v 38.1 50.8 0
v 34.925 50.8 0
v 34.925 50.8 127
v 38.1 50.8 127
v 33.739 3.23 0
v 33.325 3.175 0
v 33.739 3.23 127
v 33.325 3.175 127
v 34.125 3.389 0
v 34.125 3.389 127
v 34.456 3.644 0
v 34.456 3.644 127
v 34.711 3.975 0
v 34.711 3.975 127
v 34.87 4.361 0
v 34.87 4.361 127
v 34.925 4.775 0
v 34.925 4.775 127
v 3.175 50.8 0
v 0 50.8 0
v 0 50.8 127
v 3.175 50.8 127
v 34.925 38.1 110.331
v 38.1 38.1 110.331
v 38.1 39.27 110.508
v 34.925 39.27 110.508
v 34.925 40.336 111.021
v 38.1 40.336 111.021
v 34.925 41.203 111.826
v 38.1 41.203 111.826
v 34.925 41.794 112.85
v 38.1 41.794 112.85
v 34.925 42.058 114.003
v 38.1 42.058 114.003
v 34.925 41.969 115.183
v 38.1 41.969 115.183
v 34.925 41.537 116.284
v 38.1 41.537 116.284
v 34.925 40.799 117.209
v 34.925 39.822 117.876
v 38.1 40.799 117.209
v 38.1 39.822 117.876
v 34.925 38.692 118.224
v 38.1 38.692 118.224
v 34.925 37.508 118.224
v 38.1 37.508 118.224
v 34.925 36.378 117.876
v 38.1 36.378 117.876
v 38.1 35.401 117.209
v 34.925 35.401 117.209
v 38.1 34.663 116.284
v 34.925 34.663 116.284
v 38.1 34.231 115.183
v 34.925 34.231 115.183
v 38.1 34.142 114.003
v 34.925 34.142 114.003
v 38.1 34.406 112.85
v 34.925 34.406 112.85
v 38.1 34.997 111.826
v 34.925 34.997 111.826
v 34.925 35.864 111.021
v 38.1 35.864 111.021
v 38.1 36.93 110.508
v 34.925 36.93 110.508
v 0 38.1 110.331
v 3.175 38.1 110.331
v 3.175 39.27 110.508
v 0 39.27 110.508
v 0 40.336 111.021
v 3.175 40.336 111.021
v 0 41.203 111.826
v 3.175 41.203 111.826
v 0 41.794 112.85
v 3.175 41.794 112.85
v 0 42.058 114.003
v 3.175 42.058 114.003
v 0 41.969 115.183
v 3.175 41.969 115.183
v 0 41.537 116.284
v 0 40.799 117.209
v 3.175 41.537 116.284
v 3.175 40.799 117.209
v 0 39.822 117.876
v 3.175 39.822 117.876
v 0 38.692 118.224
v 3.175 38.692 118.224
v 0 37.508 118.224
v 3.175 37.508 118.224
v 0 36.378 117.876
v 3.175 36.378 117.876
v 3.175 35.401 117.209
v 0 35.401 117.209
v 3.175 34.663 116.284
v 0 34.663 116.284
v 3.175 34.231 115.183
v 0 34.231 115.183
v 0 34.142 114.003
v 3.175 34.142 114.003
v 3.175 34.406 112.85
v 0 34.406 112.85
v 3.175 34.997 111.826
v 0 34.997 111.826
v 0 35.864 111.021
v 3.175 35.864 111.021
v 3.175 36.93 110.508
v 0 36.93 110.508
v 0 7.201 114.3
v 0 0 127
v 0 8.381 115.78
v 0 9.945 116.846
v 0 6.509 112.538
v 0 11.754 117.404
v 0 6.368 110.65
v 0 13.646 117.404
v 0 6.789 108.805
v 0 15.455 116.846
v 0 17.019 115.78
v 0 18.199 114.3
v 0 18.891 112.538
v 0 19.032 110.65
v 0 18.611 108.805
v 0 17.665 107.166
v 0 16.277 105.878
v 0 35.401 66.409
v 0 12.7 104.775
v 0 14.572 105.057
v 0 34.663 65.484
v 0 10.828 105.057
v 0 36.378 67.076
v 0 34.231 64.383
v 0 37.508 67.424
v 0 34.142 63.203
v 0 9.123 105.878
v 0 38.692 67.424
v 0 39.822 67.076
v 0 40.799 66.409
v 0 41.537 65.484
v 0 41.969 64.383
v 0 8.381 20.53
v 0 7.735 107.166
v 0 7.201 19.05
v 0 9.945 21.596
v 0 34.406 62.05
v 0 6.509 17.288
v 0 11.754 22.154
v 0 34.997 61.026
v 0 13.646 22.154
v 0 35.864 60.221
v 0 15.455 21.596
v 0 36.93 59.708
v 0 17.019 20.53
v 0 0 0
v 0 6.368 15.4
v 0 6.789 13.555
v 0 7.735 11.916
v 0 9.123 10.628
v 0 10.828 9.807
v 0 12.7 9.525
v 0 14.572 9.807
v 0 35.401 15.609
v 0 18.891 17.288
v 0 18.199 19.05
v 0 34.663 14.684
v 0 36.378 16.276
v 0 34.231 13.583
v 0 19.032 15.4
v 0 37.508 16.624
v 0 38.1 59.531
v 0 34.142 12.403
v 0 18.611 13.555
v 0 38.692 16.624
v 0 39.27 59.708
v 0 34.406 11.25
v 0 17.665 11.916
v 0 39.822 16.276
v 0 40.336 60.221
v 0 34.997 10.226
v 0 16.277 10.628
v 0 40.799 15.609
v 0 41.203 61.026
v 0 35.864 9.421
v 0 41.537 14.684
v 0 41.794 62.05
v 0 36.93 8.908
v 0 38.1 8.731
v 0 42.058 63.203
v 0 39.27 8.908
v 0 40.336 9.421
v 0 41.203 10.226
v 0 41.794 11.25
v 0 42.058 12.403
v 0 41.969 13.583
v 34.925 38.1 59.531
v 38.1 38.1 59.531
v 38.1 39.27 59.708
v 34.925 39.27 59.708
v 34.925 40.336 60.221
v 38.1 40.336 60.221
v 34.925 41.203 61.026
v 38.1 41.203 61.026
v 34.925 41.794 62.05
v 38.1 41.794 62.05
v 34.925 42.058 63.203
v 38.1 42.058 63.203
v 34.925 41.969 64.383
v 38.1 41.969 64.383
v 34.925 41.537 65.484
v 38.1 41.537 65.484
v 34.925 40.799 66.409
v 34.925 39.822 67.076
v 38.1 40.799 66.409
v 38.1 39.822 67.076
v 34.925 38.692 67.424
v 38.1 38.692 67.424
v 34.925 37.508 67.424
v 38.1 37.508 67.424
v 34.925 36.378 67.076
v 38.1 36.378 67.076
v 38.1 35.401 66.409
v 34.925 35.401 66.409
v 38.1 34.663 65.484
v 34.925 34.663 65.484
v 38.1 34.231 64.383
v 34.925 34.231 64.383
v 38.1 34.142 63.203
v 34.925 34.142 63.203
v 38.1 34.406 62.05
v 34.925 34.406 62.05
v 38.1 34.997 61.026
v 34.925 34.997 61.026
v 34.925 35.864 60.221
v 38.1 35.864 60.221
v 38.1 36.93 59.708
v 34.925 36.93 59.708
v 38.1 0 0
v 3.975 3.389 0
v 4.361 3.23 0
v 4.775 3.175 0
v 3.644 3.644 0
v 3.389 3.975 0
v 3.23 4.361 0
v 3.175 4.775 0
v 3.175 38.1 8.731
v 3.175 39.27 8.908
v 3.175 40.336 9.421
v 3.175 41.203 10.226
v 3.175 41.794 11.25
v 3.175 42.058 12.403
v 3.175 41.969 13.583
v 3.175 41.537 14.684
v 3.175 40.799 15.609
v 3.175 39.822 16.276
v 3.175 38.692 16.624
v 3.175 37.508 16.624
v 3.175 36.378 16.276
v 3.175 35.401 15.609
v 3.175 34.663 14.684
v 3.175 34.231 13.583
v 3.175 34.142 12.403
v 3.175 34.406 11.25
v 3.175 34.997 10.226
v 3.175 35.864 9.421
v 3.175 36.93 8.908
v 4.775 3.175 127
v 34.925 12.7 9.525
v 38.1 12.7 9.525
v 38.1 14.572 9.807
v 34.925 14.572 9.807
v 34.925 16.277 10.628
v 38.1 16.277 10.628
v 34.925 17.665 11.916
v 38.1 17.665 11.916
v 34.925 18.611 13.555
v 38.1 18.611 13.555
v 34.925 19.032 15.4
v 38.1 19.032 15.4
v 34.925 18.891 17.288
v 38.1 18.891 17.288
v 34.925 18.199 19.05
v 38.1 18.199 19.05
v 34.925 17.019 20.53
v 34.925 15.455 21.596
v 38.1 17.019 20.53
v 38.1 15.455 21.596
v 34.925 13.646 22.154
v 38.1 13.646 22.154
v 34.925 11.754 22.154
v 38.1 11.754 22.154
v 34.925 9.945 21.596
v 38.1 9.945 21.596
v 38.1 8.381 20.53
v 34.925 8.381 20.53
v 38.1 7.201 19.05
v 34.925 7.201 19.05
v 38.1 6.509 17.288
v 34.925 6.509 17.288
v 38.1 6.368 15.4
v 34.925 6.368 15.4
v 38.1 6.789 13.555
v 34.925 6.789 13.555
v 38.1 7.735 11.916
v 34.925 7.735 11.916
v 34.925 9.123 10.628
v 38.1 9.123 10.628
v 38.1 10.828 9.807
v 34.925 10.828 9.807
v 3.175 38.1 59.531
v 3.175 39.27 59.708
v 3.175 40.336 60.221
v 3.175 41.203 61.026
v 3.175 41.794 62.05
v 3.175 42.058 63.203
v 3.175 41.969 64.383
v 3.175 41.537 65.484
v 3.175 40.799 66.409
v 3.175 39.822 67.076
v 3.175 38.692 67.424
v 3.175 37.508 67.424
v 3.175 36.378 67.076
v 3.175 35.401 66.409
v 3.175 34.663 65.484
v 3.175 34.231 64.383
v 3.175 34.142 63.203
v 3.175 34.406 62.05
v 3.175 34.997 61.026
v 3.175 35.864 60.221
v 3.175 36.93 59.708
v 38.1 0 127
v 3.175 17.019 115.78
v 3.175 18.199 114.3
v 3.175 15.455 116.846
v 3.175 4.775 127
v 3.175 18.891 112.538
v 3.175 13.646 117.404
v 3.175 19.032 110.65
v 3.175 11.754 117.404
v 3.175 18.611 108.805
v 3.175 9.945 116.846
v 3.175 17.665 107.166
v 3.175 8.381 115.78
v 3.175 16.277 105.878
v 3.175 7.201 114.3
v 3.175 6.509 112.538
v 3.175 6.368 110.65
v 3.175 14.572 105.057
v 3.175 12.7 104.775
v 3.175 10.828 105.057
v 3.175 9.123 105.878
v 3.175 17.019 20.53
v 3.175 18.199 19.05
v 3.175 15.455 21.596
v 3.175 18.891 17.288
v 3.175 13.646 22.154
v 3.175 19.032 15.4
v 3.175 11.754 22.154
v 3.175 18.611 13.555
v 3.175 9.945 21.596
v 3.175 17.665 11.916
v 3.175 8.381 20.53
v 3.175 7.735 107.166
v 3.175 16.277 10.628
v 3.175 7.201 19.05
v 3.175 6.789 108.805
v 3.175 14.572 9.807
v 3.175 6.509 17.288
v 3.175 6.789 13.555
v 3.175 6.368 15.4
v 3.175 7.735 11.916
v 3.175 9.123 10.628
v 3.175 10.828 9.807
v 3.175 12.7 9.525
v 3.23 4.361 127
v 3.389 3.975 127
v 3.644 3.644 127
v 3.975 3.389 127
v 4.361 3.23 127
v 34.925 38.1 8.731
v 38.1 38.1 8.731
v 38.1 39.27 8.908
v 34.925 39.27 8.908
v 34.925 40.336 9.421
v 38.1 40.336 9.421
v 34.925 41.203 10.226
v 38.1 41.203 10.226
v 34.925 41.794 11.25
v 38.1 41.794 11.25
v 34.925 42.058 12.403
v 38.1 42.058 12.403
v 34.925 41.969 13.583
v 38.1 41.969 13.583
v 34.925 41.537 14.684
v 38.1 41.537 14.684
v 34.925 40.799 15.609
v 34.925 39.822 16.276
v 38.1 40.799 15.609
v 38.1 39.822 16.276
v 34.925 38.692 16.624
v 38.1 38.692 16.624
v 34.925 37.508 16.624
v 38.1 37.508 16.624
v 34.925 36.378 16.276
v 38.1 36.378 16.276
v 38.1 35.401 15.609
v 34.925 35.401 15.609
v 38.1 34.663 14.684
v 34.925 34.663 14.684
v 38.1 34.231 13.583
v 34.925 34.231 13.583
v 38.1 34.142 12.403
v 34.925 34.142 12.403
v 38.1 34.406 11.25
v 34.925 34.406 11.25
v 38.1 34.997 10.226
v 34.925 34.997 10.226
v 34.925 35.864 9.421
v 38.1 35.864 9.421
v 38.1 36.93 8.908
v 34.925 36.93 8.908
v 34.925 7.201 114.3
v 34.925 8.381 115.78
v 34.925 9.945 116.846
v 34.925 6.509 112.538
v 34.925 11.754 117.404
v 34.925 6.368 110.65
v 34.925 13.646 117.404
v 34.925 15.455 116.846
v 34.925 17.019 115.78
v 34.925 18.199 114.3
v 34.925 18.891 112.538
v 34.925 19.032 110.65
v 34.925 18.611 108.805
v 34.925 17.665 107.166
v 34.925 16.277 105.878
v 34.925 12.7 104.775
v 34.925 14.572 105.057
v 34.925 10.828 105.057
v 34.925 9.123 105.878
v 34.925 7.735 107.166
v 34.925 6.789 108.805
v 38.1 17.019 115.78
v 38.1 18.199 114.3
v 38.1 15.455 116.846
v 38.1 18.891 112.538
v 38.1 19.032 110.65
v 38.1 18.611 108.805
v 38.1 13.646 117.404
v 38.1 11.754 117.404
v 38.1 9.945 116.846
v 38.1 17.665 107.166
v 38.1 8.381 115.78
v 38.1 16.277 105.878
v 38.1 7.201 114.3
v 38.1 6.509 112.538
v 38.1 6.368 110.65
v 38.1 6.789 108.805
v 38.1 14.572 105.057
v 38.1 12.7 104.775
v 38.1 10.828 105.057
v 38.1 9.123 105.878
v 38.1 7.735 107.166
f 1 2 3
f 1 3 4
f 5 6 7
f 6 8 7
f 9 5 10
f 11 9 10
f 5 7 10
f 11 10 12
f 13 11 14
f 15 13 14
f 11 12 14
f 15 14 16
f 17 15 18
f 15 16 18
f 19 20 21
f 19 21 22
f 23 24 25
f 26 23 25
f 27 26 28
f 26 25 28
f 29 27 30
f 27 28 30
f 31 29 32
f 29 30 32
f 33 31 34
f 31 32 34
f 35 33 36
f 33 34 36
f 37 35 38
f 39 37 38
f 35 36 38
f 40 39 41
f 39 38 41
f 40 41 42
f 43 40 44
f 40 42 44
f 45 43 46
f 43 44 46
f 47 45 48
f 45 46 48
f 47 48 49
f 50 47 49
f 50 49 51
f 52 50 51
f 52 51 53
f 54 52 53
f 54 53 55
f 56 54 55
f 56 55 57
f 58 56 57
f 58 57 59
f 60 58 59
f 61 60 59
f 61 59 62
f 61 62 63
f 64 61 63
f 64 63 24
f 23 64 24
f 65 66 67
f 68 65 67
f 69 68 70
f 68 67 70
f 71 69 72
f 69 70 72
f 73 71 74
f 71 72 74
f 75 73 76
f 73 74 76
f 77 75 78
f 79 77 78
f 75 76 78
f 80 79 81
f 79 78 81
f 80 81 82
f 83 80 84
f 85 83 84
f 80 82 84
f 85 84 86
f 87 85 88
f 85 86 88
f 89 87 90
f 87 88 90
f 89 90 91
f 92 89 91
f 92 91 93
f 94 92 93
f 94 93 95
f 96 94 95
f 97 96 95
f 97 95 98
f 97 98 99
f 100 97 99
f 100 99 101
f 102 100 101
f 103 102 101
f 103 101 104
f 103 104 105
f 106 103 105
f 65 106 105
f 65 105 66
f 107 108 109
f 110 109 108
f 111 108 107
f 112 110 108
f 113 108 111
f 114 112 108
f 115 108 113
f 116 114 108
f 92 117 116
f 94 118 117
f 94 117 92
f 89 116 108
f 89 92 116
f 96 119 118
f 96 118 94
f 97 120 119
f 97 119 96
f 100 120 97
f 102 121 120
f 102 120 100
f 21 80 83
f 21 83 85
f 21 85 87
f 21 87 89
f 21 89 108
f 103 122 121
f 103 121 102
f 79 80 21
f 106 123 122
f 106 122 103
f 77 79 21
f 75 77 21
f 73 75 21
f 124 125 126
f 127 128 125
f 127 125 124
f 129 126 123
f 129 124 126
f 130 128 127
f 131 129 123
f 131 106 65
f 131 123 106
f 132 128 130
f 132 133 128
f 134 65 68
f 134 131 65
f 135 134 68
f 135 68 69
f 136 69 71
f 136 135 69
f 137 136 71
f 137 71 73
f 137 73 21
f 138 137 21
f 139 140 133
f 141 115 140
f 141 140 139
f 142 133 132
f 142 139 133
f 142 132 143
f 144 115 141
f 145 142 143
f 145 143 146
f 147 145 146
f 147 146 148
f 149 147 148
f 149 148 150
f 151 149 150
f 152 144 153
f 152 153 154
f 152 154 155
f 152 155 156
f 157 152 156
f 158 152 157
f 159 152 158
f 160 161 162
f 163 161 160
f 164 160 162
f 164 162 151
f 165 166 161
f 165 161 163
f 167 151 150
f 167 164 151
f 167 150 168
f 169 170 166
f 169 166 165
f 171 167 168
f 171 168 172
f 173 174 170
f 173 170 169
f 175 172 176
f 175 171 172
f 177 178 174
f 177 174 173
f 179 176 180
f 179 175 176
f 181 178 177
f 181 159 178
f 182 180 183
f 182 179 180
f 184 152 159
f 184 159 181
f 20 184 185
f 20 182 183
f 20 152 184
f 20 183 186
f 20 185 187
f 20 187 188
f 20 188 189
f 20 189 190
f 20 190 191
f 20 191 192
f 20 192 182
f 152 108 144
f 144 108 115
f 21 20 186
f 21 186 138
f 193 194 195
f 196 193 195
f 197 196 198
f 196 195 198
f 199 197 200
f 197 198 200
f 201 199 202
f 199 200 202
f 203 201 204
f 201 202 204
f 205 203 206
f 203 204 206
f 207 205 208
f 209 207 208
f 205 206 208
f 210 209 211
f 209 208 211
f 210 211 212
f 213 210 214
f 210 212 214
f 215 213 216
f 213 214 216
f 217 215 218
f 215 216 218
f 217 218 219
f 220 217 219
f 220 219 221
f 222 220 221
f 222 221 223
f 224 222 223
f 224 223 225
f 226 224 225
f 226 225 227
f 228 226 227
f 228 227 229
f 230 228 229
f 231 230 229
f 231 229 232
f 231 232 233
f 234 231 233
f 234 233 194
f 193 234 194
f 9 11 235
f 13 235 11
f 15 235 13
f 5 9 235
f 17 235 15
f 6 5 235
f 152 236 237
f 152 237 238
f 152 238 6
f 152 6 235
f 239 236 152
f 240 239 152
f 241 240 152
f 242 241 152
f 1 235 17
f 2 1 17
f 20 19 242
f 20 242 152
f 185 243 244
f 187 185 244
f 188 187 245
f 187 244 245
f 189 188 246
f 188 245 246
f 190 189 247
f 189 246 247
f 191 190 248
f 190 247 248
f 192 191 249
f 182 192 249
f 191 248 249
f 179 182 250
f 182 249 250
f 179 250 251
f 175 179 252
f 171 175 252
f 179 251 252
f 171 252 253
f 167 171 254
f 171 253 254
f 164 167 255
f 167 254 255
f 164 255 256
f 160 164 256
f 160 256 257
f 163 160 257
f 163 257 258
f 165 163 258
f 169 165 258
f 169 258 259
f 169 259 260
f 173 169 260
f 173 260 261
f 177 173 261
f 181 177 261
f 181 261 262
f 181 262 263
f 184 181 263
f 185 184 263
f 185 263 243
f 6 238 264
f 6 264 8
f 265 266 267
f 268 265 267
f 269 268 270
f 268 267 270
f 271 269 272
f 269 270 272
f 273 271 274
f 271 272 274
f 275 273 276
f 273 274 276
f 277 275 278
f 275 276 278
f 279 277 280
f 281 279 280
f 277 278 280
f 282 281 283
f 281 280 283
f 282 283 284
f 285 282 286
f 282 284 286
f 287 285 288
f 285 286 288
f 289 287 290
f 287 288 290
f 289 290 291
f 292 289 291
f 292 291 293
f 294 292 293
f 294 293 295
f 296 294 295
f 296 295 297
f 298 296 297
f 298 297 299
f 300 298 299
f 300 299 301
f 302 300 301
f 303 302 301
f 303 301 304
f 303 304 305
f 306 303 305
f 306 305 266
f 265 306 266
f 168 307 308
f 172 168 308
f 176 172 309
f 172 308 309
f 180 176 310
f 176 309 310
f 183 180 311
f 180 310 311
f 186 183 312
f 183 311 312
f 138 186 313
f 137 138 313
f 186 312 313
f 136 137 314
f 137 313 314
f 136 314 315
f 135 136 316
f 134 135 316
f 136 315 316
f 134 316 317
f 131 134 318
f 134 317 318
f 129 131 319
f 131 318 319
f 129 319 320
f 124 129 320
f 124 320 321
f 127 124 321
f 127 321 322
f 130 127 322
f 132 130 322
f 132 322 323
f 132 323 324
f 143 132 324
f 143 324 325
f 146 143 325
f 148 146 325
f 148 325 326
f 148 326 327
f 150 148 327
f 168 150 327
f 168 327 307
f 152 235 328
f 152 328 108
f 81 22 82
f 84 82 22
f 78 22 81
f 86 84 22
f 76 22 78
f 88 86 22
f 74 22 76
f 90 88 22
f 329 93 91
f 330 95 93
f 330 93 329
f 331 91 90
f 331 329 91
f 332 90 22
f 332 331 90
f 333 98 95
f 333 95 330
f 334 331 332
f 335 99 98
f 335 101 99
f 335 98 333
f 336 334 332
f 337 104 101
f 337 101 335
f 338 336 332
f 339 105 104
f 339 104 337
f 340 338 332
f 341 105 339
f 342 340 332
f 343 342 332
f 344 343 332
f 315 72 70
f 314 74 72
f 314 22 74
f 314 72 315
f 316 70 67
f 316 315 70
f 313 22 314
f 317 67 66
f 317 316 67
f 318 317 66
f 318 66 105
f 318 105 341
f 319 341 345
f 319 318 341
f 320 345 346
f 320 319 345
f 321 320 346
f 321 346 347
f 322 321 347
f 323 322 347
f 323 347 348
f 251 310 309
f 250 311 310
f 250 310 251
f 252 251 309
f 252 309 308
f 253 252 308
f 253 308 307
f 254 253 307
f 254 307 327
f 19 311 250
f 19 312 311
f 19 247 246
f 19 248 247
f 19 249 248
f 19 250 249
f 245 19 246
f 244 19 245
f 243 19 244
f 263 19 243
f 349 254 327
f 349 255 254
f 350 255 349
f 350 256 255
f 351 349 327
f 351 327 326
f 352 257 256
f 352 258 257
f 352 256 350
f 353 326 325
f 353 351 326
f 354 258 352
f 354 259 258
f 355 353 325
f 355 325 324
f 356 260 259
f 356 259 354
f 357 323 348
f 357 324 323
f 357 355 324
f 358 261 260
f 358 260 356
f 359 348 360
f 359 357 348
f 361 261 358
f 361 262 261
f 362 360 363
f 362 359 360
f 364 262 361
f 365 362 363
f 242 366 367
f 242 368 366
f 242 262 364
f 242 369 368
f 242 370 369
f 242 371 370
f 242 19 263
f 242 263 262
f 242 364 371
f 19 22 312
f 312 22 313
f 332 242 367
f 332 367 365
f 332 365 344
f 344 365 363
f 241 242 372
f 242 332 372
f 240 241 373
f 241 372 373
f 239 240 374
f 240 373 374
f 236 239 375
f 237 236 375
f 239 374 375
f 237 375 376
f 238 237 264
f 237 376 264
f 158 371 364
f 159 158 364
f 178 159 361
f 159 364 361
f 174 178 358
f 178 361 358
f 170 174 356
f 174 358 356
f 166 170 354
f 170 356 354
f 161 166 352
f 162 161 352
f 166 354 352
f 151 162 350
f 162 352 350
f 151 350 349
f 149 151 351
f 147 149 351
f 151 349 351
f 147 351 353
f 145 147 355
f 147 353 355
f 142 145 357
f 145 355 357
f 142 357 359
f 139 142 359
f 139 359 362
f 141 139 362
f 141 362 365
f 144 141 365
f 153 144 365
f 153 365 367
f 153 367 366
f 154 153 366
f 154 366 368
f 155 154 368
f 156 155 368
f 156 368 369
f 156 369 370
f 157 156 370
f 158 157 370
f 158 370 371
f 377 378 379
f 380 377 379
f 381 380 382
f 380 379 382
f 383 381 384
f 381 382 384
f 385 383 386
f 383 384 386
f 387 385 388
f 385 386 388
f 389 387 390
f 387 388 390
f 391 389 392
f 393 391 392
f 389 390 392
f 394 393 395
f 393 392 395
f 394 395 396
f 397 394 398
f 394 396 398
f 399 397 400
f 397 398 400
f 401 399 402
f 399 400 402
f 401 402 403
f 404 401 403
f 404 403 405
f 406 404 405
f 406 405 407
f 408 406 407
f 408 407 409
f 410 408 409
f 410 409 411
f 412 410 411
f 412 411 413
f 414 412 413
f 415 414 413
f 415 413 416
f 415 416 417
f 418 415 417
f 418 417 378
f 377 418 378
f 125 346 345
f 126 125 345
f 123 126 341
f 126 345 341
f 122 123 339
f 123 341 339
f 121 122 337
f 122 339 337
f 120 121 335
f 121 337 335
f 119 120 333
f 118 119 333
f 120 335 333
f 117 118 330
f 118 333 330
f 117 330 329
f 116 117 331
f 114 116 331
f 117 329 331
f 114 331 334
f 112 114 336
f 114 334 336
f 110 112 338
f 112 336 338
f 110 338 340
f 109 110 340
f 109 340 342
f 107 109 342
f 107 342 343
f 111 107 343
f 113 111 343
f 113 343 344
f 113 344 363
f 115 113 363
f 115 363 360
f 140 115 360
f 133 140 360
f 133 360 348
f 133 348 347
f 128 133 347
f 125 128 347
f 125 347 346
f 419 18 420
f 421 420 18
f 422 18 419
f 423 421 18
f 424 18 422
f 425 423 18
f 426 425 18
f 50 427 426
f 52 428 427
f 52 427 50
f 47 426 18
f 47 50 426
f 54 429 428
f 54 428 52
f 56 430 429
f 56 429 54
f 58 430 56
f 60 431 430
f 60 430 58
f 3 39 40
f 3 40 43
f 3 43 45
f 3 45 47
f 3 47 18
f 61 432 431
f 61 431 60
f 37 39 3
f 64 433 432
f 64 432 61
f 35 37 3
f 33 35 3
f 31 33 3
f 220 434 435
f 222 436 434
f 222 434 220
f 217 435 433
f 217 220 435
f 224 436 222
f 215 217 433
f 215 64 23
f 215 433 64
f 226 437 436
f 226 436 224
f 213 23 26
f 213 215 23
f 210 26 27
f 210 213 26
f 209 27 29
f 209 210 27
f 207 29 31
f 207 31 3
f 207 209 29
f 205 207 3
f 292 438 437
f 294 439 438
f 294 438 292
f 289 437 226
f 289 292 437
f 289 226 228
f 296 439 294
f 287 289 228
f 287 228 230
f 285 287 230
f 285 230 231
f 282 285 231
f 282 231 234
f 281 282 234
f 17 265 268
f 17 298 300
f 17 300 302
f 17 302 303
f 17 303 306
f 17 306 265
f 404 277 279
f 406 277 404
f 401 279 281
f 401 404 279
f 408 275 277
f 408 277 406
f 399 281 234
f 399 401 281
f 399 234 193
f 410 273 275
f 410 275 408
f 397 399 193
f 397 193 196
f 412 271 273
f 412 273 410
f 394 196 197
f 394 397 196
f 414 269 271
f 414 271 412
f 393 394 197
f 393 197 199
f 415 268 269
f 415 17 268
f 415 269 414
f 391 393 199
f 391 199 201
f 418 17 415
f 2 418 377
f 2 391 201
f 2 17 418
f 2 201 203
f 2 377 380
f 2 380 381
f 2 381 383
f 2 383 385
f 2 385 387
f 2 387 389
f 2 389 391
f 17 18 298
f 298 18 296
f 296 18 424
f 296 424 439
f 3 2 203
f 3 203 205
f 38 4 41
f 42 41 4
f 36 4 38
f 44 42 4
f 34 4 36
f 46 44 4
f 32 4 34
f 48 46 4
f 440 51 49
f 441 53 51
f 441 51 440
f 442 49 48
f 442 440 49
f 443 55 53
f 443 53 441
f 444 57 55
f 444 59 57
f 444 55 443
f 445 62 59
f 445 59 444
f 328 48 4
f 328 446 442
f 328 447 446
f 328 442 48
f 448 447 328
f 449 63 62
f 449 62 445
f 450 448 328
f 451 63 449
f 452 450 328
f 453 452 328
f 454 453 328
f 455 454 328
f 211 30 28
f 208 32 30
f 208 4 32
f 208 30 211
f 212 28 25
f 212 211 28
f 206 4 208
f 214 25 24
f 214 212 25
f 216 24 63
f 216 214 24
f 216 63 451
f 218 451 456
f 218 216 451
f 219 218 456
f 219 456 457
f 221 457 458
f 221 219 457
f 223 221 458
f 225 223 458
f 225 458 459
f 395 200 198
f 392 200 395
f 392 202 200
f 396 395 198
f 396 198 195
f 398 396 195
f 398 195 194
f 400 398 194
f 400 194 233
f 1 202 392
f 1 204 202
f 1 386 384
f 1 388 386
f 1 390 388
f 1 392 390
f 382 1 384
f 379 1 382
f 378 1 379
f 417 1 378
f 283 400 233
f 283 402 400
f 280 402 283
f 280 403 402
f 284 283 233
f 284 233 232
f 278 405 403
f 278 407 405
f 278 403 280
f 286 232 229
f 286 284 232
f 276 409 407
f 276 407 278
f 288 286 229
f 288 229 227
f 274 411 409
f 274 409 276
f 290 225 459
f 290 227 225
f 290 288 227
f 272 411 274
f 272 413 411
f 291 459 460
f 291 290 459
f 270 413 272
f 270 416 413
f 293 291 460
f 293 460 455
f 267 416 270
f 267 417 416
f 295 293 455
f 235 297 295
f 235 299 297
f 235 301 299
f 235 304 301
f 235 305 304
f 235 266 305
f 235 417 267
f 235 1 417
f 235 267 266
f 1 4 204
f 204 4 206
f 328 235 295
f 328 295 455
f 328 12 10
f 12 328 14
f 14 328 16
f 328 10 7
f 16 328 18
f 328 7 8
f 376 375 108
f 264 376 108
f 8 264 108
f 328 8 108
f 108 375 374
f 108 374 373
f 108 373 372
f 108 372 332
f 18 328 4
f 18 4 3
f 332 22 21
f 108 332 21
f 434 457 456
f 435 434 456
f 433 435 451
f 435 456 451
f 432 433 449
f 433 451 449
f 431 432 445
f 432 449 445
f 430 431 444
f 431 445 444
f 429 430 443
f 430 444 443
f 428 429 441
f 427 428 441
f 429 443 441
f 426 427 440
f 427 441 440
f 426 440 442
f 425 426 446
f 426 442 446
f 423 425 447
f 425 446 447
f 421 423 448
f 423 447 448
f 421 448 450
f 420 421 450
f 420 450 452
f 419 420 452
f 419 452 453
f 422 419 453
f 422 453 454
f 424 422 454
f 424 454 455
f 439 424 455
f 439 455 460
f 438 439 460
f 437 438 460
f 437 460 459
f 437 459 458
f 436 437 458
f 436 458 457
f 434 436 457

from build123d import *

# Parameters (mm, degrees)
BOSS_EXTRUDE1_DEPTH = 127
SKETCH2_R           = 6.35
SKETCH2_R_2         = 3.96875
CUT_EXTRUDE1_DEPTH  = 152.4
FILLET1_R           = 1.6002


with BuildPart() as part:
    # Sketch1 → Boss-Extrude1 (new body)
    with BuildSketch(Plane.XY):
        Polygon((3.175, 50.8), (3.175, 3.175), (34.925, 3.175), (34.925, 50.8), (38.1, 50.8), (38.1, 0), (0, 0), (0, 50.8), align=None)
    extrude(amount=BOSS_EXTRUDE1_DEPTH)

    # Sketch2 → Cut-Extrude1 (cut)
    with BuildSketch(Plane(origin=(38.1, 0, 0), x_dir=(0, 0, -1), z_dir=(1, 0, 0))):
        with Locations((-15.875, 12.7)):
            Circle(SKETCH2_R)
        with Locations((-111.125, 12.7)):
            Circle(SKETCH2_R)
        with Locations((-114.3, 38.1)):
            Circle(SKETCH2_R_2)
        with Locations((-63.5, 38.1)):
            Circle(SKETCH2_R_2)
        with Locations((-12.7, 38.1)):
            Circle(SKETCH2_R_2)
    extrude(amount=-CUT_EXTRUDE1_DEPTH, mode=Mode.SUBTRACT)

    # Fillet1
    fillet1_edges = [part.edges().sort_by_distance(p)[0] for p in [
        (3.175, 3.175, 63.5),
        (34.925, 3.175, 63.5),
    ]]
    fillet(fillet1_edges, radius=FILLET1_R)


solid = part.part
